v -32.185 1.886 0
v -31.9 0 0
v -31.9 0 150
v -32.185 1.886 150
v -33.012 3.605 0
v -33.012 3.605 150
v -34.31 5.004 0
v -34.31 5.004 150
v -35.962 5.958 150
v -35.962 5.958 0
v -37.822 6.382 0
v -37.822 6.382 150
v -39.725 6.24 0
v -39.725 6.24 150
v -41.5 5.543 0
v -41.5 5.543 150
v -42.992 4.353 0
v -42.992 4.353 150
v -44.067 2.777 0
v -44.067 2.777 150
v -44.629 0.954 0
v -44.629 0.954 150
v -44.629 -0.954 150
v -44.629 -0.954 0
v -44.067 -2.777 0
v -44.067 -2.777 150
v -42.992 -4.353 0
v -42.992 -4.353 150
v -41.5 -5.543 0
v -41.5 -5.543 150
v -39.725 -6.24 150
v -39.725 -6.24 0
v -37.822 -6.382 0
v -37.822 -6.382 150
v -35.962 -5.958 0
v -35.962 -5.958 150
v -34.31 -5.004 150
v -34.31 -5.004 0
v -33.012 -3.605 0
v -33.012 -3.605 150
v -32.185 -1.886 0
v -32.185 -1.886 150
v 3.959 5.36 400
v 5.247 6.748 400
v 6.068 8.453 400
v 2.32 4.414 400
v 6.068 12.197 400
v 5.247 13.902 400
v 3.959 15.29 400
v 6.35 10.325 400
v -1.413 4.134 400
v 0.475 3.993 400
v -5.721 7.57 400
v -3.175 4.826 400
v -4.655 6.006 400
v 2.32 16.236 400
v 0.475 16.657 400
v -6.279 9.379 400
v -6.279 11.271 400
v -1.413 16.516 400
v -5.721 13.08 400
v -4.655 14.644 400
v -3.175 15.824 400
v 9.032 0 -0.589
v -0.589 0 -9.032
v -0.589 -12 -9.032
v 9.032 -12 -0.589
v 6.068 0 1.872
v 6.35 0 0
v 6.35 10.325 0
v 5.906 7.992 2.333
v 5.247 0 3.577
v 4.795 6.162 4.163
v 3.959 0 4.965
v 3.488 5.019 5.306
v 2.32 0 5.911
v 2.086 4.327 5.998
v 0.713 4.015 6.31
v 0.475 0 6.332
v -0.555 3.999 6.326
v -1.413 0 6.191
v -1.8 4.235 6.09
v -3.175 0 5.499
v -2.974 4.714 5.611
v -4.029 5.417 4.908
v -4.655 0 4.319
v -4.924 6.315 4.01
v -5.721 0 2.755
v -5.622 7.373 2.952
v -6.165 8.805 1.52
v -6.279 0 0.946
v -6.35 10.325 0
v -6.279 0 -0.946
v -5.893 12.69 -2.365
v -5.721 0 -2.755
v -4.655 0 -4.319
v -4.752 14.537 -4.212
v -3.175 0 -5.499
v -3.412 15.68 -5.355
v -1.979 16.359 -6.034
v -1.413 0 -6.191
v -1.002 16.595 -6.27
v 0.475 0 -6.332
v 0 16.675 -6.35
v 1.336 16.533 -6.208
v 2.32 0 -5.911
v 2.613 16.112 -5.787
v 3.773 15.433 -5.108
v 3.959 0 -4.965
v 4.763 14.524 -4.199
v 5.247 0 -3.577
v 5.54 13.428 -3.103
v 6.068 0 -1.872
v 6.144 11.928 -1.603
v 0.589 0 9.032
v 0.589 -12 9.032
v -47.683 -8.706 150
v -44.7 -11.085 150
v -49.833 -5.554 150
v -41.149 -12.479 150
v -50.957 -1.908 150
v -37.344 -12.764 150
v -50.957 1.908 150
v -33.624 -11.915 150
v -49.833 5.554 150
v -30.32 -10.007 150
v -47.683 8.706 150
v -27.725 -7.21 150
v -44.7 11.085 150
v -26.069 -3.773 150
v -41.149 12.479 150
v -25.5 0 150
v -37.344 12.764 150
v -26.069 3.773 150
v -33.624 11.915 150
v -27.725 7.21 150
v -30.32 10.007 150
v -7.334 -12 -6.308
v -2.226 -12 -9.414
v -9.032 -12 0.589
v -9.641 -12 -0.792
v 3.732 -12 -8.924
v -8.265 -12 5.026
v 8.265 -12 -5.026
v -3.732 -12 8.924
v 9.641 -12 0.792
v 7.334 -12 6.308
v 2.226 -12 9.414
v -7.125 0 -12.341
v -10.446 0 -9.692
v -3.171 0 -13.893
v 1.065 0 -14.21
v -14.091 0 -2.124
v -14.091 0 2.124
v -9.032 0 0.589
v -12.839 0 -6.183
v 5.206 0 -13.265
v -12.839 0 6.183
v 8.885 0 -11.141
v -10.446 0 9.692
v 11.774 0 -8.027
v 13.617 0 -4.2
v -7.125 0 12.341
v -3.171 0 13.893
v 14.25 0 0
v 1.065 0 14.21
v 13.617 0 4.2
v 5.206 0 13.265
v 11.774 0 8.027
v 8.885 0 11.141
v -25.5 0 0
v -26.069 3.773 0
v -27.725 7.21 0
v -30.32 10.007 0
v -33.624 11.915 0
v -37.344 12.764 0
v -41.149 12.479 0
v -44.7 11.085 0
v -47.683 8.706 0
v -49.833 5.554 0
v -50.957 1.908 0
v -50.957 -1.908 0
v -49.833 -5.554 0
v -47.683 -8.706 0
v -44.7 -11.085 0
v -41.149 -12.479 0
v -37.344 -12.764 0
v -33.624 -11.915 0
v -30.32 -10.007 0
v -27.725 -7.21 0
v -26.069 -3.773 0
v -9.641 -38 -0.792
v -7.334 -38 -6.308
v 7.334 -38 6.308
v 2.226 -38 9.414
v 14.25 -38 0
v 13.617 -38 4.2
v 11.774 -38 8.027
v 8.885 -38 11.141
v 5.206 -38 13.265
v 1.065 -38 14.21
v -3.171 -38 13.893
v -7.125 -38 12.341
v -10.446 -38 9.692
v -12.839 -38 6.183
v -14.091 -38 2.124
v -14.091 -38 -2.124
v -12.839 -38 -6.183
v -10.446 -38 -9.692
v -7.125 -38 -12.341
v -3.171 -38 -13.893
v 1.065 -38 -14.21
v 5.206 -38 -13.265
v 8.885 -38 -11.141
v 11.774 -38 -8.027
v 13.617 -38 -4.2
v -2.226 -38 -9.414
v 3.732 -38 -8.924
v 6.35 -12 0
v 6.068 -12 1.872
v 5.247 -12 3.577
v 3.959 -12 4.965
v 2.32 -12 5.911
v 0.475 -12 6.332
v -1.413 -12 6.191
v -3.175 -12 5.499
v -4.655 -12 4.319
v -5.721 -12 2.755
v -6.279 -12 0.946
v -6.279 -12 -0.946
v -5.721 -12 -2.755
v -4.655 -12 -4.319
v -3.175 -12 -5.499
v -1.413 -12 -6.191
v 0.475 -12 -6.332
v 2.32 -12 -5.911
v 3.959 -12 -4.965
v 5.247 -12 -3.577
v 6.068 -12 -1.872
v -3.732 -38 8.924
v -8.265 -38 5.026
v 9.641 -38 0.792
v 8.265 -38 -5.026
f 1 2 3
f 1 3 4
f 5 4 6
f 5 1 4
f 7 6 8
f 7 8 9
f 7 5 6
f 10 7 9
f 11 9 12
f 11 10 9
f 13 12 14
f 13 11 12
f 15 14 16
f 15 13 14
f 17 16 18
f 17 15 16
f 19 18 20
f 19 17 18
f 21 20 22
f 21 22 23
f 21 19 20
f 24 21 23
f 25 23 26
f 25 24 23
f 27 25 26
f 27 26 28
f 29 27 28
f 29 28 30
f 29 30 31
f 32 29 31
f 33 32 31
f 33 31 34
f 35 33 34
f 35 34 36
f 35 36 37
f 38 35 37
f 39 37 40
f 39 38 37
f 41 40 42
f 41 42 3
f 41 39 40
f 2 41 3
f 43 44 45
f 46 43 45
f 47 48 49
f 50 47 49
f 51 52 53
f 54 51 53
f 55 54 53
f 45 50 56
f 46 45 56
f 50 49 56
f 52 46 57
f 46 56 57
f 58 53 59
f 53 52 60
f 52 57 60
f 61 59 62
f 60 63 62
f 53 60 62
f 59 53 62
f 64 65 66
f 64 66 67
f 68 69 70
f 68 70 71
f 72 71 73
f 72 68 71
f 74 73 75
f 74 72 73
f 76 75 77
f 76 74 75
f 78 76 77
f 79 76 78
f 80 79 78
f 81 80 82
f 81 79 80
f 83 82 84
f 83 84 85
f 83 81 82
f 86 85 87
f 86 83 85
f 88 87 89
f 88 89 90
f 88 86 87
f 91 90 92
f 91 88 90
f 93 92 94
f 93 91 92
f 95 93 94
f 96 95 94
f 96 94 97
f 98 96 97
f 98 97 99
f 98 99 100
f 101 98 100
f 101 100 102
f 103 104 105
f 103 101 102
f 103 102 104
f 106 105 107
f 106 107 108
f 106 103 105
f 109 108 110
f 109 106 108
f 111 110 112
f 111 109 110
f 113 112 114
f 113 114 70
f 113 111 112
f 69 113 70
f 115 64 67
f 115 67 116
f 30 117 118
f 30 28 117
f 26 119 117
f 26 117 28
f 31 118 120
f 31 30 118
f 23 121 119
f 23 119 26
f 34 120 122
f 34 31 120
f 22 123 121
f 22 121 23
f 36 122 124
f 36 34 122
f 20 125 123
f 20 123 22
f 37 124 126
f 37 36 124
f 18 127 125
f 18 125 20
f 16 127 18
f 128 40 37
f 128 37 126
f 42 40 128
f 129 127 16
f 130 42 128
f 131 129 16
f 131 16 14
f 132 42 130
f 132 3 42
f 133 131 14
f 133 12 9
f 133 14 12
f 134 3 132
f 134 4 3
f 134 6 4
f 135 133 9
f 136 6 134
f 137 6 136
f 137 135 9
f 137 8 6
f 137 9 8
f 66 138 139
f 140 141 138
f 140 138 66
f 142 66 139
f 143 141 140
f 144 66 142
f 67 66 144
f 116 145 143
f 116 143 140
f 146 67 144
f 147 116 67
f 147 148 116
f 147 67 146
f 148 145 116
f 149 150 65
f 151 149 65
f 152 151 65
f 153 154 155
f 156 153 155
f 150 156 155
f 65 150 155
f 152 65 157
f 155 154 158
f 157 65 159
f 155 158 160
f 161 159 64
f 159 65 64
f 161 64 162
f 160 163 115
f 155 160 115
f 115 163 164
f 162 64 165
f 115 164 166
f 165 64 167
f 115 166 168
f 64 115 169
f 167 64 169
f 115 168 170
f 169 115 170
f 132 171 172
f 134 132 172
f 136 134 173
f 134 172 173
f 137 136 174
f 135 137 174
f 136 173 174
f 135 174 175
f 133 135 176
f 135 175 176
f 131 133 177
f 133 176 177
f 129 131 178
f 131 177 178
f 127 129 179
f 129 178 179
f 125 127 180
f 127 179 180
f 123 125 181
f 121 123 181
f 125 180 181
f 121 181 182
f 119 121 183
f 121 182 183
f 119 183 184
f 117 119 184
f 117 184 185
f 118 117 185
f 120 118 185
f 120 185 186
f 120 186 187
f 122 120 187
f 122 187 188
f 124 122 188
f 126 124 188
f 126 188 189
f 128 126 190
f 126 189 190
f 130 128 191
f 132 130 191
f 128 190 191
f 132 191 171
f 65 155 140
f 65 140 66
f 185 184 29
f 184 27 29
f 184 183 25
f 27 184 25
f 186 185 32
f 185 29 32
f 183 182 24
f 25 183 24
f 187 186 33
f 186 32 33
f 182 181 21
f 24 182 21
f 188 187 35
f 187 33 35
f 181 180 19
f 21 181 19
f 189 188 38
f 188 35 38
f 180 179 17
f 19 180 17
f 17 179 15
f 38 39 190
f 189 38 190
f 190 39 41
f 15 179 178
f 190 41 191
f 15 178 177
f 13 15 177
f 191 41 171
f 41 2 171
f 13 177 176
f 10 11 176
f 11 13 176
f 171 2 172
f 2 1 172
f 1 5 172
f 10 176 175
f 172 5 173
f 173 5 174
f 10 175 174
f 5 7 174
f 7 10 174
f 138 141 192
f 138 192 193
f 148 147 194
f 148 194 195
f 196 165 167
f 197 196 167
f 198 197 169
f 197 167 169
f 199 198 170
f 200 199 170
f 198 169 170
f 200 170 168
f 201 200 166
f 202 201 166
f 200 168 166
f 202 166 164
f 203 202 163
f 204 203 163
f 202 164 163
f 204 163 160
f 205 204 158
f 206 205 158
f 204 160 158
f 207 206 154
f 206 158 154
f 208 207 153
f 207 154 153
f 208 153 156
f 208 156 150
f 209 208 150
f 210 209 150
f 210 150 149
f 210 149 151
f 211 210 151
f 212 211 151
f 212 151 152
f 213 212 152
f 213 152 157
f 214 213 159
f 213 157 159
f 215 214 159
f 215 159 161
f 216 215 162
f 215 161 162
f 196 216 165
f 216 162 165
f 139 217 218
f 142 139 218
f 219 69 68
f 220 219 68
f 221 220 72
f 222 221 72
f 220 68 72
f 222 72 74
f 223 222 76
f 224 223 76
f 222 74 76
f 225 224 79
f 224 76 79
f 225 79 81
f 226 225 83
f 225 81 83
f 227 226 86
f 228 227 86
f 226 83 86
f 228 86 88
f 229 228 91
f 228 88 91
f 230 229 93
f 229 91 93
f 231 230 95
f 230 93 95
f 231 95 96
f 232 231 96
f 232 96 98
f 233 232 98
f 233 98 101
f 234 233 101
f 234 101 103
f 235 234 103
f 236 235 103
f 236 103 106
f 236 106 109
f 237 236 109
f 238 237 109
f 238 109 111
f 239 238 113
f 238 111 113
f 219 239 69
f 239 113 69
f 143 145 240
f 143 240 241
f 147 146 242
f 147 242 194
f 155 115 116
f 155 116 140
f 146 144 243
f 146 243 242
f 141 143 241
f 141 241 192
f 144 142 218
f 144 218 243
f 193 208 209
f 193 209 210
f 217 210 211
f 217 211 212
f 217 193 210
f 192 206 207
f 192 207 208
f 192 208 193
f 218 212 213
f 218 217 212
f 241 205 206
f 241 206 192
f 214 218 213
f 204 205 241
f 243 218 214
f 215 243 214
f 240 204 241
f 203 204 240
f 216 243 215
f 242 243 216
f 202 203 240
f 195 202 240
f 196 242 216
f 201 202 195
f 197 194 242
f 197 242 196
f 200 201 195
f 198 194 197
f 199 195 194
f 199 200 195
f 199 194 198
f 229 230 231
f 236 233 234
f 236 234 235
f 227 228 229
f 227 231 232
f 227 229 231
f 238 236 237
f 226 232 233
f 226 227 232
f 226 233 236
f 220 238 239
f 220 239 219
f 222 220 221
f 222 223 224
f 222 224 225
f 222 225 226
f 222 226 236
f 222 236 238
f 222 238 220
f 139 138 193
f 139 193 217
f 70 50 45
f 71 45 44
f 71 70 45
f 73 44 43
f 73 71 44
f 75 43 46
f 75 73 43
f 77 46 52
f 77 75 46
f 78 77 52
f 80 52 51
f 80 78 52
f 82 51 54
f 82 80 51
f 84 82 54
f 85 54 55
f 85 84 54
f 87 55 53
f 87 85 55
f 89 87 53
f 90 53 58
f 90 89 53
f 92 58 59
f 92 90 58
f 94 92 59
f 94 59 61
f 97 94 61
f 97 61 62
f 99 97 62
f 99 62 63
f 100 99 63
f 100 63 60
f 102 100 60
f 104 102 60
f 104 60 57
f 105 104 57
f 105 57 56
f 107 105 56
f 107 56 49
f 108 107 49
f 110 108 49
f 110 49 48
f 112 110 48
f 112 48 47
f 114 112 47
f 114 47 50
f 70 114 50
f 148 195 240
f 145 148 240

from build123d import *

# Parameters (mm, degrees)
F0_R      = 14.25
F1_DEPTH  = 38
F3_DEPTH  = 40
F4_DEPTH  = 12
F6_DEPTH  = 15
F7_R      = 6.35
F10_R     = 12.8
F10_R_2   = 6.4
F11_DEPTH = 150
F12_DEPTH = 12


with BuildPart() as f1:
    # F0 (on Front) → F1 (new body)
    with BuildSketch(Plane.XZ):
        Circle(F0_R)
    extrude(amount=F1_DEPTH)

    # F2 (on Front) → F3 (cut)
    with BuildSketch(Plane.XZ):
        Polygon((3.7324627706, -8.9243713627), (8.2652396853, -5.0260815253), (9.6409759653, 0.7920006246), (7.3341871114, 6.307565455), (2.2259880607, 9.4138546678), (-3.7324627706, 8.9243713627), (-8.2652396853, 5.0260815253), (-9.6409759653, -0.7920006246), (-7.3341871114, -6.307565455), (-2.2259880607, -9.4138546678), align=None)
    extrude(amount=F3_DEPTH, mode=Mode.SUBTRACT)

    # F2 (on Front) → F4 (join)
    with BuildSketch(Plane.XZ):
        Polygon((3.7324627706, -8.9243713627), (8.2652396853, -5.0260815253), (9.6409759653, 0.7920006246), (7.3341871114, 6.307565455), (2.2259880607, 9.4138546678), (-3.7324627706, 8.9243713627), (-8.2652396853, 5.0260815253), (-9.6409759653, -0.7920006246), (-7.3341871114, -6.307565455), (-2.2259880607, -9.4138546678), align=None)
    extrude(amount=F4_DEPTH)

    # F5 (on Front) → F6 (cut)
    with BuildSketch(Plane.XZ):
        Polygon((-0.588765686, -9.0317968847), (9.0317968847, -0.588765686), (0.588765686, 9.0317968847), (-9.0317968847, 0.588765686), align=None)
    extrude(amount=F6_DEPTH, mode=Mode.SUBTRACT)


with BuildPart() as f9:
    # F9: sweep along a path in F8
    with BuildLine(Plane.YZ) as f9_path:
        Line((10.325, 400), (10.325, 0))
        Line((10.325, 0), (0, 0))
    # F7 (on Front) → F9 (sweep)
    with BuildSketch(Plane.XZ):
        Circle(F7_R)
    sweep(path=f9_path.line, transition=Transition.RIGHT)

    # F7 (on Front) → F12 (join)
    with BuildSketch(Plane.XZ):
        Circle(F7_R)
    extrude(amount=F12_DEPTH)


with BuildPart() as f11:
    # F10 (on Top) → F11 (new body)
    with BuildSketch(Plane.XY):
        with Locations((-38.3003803454, 0)):
            Circle(F10_R)
        with Locations((-38.3003803454, 0)):
            Circle(F10_R_2, mode=Mode.SUBTRACT)
    extrude(amount=F11_DEPTH)


solid = Compound([f1.part, f9.part, f11.part])
